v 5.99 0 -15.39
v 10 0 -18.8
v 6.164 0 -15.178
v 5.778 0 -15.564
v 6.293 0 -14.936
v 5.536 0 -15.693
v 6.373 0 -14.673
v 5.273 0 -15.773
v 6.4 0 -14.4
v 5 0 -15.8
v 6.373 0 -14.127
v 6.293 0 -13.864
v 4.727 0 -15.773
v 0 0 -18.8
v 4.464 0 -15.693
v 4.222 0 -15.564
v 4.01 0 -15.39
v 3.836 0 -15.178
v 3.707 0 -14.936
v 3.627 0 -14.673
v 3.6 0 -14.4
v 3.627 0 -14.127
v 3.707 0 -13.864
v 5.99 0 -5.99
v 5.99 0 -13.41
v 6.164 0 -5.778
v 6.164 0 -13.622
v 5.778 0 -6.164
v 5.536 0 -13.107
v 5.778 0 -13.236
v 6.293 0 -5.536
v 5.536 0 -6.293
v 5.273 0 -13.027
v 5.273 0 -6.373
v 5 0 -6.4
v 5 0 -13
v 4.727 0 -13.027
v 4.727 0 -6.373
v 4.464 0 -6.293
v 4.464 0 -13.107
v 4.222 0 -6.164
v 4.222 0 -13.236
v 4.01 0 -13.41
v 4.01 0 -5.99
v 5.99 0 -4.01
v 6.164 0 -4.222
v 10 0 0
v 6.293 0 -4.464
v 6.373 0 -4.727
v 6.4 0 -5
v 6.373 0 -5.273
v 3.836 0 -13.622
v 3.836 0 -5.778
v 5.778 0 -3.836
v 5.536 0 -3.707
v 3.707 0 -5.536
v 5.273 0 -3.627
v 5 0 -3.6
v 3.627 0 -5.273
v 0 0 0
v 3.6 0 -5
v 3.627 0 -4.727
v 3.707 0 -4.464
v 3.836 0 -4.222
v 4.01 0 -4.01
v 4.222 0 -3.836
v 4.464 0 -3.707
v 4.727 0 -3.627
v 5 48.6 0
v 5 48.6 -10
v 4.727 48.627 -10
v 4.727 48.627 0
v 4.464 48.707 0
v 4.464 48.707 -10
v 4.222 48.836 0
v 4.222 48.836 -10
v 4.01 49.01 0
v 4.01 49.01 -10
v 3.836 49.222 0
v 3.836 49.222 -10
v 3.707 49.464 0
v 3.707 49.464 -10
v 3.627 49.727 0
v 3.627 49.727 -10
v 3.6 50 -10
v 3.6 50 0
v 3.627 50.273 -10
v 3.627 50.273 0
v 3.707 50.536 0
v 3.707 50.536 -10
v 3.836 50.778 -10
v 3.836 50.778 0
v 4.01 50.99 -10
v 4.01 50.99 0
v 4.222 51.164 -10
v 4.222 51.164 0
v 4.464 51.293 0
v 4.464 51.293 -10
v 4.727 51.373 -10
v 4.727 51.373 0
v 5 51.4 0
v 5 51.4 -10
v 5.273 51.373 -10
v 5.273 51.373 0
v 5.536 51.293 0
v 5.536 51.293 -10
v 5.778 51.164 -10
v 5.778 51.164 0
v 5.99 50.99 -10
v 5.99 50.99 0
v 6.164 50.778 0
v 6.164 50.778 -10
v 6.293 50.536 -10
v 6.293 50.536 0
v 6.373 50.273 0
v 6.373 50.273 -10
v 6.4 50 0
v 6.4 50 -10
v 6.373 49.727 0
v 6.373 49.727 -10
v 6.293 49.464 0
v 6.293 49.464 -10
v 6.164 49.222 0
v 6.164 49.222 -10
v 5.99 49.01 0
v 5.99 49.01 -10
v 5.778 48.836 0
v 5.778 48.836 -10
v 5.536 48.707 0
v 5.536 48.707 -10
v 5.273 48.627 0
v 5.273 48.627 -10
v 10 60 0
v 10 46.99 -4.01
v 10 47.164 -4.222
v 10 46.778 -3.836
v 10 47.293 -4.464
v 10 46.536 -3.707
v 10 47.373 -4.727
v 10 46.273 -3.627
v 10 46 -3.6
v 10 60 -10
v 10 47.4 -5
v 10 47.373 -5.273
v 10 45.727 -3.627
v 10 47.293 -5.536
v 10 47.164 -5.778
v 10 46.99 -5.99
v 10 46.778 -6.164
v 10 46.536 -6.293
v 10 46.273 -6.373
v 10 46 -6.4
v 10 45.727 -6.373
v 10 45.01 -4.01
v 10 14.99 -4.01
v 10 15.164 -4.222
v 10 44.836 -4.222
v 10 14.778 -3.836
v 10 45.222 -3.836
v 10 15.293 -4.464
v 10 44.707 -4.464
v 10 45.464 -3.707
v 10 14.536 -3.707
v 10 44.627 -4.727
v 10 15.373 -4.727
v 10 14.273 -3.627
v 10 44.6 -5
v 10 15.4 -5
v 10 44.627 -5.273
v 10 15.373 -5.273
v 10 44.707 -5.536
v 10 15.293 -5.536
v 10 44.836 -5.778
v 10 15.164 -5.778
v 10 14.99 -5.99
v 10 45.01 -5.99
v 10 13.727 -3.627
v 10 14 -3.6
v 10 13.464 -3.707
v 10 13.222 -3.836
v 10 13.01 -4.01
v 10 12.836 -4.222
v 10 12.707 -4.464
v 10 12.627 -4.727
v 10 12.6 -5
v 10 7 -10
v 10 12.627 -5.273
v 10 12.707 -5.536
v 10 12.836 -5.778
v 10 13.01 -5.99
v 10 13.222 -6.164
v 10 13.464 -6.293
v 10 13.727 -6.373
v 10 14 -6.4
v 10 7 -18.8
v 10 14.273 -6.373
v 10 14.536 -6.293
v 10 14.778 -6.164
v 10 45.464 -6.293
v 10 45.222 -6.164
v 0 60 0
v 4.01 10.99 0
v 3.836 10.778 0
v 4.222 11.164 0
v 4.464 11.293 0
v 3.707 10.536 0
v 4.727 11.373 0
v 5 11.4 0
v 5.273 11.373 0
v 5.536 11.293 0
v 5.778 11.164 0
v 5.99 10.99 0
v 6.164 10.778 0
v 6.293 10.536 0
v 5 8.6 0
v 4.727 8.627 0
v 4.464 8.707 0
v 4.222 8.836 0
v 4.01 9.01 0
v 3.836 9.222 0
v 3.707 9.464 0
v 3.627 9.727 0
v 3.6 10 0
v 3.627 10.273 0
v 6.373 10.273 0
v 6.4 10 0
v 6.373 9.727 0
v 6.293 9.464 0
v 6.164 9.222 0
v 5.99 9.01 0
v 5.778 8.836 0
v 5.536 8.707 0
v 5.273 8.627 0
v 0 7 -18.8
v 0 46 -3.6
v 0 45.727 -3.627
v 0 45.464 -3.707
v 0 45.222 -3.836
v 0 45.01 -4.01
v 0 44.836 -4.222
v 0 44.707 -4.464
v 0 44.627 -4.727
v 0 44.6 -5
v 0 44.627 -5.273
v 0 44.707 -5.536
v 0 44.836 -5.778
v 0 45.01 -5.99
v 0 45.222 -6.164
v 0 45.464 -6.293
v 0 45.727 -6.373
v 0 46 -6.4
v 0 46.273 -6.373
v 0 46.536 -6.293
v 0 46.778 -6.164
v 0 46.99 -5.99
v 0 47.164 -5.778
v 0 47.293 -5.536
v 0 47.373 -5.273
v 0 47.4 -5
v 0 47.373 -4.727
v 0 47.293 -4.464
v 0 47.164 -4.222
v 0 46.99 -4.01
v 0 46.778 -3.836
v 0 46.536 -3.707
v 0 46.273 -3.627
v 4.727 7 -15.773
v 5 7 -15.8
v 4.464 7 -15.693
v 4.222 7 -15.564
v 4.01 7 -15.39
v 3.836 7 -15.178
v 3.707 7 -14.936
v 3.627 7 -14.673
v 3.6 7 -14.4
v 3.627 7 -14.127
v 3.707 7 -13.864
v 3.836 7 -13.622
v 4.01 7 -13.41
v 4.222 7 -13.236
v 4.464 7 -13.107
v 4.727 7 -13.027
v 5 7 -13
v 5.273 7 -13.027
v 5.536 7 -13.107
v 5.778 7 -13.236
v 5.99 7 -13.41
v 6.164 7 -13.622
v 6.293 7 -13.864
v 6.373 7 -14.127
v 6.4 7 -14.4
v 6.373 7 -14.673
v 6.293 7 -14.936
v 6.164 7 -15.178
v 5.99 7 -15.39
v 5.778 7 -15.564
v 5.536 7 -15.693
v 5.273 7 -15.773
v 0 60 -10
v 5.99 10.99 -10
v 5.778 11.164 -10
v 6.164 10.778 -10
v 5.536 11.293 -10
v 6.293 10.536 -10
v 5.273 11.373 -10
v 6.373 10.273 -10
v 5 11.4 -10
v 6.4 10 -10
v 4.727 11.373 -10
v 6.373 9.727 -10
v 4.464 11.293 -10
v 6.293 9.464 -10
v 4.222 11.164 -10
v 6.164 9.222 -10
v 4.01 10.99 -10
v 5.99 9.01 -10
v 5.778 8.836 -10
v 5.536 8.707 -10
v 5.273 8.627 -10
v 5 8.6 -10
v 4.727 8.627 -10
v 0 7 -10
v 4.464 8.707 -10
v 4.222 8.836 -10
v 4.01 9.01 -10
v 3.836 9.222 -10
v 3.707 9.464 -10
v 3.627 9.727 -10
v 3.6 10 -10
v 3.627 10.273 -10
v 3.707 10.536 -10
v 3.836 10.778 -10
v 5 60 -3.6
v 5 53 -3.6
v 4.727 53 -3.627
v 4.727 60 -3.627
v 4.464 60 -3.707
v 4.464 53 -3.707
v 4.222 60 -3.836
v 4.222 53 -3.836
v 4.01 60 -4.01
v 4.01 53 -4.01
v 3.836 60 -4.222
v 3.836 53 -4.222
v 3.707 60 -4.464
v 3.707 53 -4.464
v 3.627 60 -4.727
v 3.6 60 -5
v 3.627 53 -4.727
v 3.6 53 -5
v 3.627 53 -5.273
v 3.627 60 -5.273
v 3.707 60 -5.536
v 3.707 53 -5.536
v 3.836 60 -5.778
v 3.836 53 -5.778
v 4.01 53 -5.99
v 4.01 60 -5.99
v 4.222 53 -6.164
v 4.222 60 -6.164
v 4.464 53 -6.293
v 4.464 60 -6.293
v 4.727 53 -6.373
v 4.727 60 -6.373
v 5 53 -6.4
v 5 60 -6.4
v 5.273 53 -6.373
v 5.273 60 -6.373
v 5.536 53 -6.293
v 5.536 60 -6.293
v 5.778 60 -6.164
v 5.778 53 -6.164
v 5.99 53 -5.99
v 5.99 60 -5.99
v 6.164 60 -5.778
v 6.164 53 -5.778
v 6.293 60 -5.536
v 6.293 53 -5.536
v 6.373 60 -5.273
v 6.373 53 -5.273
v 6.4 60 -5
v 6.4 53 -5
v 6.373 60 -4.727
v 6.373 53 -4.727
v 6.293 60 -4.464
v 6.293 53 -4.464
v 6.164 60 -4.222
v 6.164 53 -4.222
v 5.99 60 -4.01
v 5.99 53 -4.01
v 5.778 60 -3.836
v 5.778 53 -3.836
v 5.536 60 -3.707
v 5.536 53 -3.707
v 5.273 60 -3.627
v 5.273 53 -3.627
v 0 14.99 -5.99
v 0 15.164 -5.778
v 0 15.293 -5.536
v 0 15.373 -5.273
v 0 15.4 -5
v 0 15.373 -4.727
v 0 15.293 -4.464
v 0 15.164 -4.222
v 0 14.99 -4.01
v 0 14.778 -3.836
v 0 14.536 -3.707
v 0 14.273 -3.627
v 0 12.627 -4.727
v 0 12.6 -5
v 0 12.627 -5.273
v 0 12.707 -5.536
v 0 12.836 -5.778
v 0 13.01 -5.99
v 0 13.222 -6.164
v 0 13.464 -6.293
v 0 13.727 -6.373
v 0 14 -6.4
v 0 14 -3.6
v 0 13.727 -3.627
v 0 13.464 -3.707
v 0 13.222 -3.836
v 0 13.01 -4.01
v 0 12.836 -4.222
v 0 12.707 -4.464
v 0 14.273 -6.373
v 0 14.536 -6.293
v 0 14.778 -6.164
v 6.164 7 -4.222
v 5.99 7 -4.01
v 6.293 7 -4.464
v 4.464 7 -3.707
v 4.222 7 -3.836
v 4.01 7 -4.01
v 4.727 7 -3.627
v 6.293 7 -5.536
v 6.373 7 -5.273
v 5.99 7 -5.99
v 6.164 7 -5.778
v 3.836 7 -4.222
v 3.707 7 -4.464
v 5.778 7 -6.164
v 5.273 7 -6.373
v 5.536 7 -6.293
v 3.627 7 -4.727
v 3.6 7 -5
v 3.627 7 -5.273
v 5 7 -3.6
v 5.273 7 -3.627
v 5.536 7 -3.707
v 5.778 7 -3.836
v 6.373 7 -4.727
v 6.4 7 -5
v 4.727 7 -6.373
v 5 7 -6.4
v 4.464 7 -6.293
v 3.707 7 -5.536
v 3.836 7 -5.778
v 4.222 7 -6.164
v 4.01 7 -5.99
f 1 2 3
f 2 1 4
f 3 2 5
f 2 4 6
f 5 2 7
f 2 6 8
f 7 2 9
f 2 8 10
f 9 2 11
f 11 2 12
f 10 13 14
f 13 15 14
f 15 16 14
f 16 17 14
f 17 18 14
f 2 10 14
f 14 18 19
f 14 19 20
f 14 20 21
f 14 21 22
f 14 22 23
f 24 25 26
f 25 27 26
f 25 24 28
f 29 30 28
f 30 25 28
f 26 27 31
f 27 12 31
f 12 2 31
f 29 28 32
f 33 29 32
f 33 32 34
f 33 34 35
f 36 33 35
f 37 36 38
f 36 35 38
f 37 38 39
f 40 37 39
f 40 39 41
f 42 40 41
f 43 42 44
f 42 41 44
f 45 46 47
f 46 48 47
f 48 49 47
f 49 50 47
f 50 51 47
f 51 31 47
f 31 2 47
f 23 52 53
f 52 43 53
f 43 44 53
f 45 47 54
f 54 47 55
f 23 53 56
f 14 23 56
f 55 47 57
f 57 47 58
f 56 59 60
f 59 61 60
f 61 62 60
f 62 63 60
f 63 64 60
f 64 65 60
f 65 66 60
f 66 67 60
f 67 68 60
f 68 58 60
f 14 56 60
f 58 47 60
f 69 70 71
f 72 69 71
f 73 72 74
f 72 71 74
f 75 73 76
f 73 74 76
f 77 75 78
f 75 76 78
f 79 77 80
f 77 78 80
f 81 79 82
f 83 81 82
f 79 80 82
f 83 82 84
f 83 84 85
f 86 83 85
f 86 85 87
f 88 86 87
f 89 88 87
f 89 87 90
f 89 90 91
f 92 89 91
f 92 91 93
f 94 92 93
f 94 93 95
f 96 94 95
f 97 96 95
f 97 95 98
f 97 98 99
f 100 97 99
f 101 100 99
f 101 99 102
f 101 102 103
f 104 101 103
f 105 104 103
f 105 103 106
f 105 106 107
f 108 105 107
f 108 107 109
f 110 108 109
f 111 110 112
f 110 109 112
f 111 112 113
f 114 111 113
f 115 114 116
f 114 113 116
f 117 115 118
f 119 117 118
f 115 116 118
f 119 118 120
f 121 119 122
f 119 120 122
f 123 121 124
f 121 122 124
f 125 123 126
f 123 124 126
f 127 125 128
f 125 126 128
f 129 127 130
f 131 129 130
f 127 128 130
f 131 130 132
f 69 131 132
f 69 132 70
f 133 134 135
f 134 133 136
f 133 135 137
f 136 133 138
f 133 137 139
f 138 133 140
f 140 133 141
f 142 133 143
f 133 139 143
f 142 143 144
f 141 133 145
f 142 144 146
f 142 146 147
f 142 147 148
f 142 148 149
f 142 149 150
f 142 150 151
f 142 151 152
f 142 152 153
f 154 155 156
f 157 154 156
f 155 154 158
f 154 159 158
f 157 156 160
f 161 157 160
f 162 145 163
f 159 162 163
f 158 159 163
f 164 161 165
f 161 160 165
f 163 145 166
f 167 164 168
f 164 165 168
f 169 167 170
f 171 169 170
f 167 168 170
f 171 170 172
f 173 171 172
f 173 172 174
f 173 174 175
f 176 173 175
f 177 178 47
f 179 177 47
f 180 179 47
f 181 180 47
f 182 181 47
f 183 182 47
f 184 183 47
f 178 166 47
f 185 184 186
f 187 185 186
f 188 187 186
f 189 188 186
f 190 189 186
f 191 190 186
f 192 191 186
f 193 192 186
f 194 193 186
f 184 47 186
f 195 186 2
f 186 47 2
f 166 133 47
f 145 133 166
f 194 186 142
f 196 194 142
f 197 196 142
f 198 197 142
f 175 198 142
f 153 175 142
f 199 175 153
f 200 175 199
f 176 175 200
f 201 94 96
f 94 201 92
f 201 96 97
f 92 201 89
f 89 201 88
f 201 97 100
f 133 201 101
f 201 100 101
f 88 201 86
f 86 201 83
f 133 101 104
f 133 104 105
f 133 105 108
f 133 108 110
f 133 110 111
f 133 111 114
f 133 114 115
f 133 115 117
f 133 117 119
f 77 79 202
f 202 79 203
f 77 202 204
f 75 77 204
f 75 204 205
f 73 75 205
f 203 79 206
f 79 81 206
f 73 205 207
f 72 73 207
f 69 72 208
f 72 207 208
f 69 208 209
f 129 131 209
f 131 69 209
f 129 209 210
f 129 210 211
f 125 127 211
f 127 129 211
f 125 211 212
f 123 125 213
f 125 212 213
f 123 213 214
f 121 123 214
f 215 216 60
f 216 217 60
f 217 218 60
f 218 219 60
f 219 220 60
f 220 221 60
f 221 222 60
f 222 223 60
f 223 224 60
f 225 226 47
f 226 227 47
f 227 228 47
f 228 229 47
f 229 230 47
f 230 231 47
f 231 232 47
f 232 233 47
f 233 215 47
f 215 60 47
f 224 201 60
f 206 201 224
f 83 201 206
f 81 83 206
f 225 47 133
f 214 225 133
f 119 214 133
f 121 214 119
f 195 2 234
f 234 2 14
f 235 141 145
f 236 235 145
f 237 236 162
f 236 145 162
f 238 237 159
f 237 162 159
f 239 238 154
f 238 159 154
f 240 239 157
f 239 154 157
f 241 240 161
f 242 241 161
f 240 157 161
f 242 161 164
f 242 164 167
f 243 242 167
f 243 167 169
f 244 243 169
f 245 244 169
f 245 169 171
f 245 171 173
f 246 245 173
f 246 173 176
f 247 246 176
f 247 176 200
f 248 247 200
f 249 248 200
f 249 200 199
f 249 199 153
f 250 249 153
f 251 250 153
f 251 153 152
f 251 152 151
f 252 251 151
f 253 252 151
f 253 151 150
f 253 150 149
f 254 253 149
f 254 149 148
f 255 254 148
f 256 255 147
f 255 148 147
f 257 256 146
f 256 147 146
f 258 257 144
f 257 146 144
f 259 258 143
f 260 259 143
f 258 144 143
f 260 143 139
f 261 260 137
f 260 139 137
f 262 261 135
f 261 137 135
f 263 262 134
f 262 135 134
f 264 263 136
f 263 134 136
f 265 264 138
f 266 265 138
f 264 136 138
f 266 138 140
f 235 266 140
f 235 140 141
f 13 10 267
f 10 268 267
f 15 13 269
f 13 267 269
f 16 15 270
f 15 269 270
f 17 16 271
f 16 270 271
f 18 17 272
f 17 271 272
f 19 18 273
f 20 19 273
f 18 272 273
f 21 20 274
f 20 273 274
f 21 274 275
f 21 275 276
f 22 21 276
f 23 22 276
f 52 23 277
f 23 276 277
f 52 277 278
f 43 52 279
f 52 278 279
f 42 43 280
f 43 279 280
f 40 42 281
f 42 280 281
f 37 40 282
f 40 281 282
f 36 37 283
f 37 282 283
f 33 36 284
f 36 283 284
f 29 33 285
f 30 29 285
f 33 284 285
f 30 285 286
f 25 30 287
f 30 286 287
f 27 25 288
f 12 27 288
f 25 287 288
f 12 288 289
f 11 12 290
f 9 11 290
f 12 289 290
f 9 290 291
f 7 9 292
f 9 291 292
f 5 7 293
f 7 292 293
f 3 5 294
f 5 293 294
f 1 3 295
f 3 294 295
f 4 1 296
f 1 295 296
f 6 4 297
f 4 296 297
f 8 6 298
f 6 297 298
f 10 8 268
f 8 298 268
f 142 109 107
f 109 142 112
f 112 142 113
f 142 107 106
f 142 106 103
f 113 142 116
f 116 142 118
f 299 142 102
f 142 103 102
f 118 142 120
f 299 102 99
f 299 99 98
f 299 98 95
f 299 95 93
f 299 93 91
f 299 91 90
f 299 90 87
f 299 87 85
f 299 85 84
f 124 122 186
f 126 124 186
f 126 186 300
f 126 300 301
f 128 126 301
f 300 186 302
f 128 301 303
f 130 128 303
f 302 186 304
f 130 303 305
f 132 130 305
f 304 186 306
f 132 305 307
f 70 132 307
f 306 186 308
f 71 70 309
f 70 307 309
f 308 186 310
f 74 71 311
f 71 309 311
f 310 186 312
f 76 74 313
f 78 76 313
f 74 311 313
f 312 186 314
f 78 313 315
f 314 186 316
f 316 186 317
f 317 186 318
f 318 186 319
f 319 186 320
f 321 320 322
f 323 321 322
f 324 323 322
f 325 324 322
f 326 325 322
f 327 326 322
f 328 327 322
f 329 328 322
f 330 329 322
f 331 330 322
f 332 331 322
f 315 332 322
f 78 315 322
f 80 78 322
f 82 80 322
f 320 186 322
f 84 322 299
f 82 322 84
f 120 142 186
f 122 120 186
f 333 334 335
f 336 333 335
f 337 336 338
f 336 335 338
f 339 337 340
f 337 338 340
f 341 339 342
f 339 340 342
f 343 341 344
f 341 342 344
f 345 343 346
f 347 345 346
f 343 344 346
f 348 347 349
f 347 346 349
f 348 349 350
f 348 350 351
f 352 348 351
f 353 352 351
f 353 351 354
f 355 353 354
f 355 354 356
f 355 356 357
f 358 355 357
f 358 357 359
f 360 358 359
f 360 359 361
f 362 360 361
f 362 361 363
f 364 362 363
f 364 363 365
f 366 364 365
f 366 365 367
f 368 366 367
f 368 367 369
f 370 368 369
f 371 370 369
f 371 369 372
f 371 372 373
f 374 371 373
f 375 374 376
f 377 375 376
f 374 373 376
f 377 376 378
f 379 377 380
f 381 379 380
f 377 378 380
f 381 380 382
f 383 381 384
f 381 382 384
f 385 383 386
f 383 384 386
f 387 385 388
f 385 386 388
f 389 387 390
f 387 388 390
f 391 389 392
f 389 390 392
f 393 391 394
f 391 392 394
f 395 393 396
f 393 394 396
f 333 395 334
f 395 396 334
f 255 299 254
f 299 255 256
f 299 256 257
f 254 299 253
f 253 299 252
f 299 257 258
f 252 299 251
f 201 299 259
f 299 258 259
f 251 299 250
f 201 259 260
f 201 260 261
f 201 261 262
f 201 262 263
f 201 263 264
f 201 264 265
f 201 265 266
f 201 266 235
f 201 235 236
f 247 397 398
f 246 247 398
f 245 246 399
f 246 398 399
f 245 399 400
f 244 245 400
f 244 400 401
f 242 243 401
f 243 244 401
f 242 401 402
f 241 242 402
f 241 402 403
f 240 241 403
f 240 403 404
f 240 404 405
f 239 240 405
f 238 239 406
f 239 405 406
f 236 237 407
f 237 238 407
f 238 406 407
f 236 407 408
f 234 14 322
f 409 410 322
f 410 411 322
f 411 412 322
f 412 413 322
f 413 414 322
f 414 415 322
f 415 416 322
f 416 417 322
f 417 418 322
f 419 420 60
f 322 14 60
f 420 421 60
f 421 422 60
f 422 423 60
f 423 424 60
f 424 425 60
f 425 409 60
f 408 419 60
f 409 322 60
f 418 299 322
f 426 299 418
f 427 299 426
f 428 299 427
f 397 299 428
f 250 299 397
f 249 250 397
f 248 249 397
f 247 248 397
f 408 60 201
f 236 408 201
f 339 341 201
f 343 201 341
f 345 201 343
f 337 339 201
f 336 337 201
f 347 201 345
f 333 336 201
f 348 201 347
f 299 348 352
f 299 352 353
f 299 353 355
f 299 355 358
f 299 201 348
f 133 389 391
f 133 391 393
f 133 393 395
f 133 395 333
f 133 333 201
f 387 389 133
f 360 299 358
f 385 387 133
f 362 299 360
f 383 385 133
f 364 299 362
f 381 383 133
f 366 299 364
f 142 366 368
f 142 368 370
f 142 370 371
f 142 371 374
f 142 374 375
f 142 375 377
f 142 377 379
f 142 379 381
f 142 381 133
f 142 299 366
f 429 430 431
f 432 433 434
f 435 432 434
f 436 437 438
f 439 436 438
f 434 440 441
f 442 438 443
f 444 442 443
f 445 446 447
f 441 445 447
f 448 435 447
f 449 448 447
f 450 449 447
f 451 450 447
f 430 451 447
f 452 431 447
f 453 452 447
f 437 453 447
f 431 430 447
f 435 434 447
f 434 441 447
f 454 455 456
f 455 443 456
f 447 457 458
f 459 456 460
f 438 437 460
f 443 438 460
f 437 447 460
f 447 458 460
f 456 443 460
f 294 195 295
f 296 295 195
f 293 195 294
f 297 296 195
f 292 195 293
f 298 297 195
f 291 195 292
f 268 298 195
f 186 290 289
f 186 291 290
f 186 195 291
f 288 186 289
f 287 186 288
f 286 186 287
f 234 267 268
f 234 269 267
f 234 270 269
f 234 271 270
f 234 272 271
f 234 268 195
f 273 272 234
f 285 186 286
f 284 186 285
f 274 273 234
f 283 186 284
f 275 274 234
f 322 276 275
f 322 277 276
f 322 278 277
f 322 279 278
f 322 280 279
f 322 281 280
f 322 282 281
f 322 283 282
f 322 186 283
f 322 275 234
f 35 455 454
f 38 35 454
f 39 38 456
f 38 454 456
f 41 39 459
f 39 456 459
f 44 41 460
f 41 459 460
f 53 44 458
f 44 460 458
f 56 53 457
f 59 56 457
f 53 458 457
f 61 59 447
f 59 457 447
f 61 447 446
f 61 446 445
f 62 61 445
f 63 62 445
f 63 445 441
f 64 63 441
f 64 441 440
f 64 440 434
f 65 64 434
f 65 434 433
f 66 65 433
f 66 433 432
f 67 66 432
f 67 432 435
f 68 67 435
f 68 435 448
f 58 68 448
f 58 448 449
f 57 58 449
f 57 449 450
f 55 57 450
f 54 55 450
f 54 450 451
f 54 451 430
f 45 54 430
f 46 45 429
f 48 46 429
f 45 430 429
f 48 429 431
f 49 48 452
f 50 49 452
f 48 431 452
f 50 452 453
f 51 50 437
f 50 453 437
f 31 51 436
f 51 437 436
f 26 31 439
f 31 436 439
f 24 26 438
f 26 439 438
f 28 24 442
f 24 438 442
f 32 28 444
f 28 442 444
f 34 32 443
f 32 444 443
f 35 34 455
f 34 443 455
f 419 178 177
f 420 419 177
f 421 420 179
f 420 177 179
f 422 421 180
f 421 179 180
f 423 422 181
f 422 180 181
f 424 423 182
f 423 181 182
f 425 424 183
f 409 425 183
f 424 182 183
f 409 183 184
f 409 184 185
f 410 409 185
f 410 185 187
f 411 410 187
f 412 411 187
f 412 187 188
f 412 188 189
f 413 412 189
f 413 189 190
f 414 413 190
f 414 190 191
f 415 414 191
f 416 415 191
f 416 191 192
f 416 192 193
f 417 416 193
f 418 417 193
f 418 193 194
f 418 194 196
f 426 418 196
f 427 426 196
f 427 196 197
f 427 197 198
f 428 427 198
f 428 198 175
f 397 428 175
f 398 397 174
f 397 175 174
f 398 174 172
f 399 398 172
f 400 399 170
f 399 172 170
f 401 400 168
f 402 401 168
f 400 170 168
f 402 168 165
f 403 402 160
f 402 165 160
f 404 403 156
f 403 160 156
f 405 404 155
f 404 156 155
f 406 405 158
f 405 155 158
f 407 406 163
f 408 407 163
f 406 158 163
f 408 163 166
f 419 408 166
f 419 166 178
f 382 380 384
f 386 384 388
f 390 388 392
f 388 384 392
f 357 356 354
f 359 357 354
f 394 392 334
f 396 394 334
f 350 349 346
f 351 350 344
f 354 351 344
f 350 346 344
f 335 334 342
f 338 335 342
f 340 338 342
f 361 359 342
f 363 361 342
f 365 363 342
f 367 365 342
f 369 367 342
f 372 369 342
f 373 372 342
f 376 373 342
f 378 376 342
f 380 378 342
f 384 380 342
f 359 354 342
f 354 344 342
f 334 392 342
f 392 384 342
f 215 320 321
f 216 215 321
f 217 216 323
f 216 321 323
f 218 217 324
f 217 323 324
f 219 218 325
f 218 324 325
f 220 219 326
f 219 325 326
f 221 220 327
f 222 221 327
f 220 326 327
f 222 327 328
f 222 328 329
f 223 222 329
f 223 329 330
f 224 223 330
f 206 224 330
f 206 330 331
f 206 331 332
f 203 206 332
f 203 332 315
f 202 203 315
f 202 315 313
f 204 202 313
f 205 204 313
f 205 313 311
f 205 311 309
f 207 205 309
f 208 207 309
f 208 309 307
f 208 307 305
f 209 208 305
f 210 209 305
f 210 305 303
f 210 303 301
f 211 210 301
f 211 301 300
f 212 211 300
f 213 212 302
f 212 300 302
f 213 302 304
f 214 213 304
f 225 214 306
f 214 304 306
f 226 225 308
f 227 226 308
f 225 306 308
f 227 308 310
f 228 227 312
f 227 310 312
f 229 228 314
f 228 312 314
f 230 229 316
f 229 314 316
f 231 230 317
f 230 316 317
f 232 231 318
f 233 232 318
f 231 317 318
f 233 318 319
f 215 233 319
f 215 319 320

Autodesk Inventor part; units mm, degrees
ref_plane "YZ Plane" through (0, 0, 0) normal (1, 0, 0) x (0, 1, 0)
ref_plane "XZ Plane" through (0, 0, 0) normal (0, 1, 0) x (-1, 0, 0)
ref_plane "XY Plane" through (0, 0, 0) normal (0, 0, 1) x (1, 0, 0)
sketch "Эскиз1" plane through (0, 0, 0) normal (0, 1, 0) x (-1, 0, 0)
  line L0 (0, 0) -> (-10, 0)
  line L1 (-10, 0) -> (-10, -18.8)
  line L2 (-10, -18.8) -> (0, -18.8)
  line L3 (0, -18.8) -> (0, 0)
  point P0 (0, 0)
  dimension "d0" = 10
  dimension "d1" = 18.8
extrude "Выдавливание1" add sketch "Эскиз1" along normal blind 7
sketch "Эскиз2" plane through (0, 7, 0) normal (0, 1, 0) x (1, 0, 0)
  line L0 (10, 0) -> (10, 18.8) projected
  line L1 (0, 0) -> (10, 0)
  line L2 (10, 0) -> (10, 10)
  line L3 (10, 10) -> (0, 10)
  line L4 (0, 10) -> (0, 0)
  dimension "d4" = 10
extrude "Выдавливание2" add sketch "Эскиз2" along normal blind 53
sketch "Эскиз4" plane through (0, 0, 0) normal (0, -1, 0) x (1, 0, 0)
  line L0 (0, 0) -> (10, 0) projected
  line L1 (0, 0) -> (10, 0) projected
  line L2 (10, 0) -> (10, -10) projected
  line L3 (10, -10) -> (0, -10) projected
  line L4 (0, -10) -> (0, 0) projected
  line L5 (0, -10) -> (10, -10) projected
  line L6 (10, -10) -> (10, -18.8) projected
  line L7 (10, -18.8) -> (0, -18.8) projected
  line L8 (0, -18.8) -> (0, -10) projected
  point P0 (5, -5)
  point P1 (5, -14.4)
  point P2 (5, 0)
  point P3 (10, -5)
  point P4 (10, -14.4)
hole "Отверстие1" at (5, 0, -5) at (5, 0, -14.4) direction (0, 1, 0) diameter 2.8 depth 7
sketch "Эскиз7" plane through (0, 0, 0) normal (0, 0, 1) x (1, 0, 0)
  line L0 (0, 0) -> (10, 0) projected
  line L1 (0, 60) -> (10, 60) projected
  point P0 (5, 10)
  point P1 (5, 50)
  point P2 (5, 0)
  dimension "d21" = 10
  dimension "d22" = 10
hole "Отверстие2" at (5, 10, 0) at (5, 50, 0) direction (0, 0, -1) diameter 2.8 end through all
sketch "Эскиз9" plane through (0, 60, 0) normal (0, 1, 0) x (1, 0, 0)
  circle A0 centre (5, 5) radius 1.4 projected
  point P0 (0, 0)
hole "Отверстие3" at (5, 60, -5) direction (0, -1, 0) diameter 2.8 depth 7
sketch "Эскиз11" plane through (0, 0, -18.8) normal (-1, 0, 0) x (0, 0, 1)
  line L0 (8.8, 60) -> (18.8, 60) projected
  line L1 (0, 0) -> (18.8, 0) projected
  point P0 (13.8, 14)
  point P1 (13.8, 46)
  point P2 (13.8, 60)
  dimension "d37" = 14
  dimension "d38" = 14
hole "Отверстие4" at (0, 14, -5) at (0, 46, -5) direction (1, 0, 0) diameter 2.8 end through all
properties part number "StructureCenter"
